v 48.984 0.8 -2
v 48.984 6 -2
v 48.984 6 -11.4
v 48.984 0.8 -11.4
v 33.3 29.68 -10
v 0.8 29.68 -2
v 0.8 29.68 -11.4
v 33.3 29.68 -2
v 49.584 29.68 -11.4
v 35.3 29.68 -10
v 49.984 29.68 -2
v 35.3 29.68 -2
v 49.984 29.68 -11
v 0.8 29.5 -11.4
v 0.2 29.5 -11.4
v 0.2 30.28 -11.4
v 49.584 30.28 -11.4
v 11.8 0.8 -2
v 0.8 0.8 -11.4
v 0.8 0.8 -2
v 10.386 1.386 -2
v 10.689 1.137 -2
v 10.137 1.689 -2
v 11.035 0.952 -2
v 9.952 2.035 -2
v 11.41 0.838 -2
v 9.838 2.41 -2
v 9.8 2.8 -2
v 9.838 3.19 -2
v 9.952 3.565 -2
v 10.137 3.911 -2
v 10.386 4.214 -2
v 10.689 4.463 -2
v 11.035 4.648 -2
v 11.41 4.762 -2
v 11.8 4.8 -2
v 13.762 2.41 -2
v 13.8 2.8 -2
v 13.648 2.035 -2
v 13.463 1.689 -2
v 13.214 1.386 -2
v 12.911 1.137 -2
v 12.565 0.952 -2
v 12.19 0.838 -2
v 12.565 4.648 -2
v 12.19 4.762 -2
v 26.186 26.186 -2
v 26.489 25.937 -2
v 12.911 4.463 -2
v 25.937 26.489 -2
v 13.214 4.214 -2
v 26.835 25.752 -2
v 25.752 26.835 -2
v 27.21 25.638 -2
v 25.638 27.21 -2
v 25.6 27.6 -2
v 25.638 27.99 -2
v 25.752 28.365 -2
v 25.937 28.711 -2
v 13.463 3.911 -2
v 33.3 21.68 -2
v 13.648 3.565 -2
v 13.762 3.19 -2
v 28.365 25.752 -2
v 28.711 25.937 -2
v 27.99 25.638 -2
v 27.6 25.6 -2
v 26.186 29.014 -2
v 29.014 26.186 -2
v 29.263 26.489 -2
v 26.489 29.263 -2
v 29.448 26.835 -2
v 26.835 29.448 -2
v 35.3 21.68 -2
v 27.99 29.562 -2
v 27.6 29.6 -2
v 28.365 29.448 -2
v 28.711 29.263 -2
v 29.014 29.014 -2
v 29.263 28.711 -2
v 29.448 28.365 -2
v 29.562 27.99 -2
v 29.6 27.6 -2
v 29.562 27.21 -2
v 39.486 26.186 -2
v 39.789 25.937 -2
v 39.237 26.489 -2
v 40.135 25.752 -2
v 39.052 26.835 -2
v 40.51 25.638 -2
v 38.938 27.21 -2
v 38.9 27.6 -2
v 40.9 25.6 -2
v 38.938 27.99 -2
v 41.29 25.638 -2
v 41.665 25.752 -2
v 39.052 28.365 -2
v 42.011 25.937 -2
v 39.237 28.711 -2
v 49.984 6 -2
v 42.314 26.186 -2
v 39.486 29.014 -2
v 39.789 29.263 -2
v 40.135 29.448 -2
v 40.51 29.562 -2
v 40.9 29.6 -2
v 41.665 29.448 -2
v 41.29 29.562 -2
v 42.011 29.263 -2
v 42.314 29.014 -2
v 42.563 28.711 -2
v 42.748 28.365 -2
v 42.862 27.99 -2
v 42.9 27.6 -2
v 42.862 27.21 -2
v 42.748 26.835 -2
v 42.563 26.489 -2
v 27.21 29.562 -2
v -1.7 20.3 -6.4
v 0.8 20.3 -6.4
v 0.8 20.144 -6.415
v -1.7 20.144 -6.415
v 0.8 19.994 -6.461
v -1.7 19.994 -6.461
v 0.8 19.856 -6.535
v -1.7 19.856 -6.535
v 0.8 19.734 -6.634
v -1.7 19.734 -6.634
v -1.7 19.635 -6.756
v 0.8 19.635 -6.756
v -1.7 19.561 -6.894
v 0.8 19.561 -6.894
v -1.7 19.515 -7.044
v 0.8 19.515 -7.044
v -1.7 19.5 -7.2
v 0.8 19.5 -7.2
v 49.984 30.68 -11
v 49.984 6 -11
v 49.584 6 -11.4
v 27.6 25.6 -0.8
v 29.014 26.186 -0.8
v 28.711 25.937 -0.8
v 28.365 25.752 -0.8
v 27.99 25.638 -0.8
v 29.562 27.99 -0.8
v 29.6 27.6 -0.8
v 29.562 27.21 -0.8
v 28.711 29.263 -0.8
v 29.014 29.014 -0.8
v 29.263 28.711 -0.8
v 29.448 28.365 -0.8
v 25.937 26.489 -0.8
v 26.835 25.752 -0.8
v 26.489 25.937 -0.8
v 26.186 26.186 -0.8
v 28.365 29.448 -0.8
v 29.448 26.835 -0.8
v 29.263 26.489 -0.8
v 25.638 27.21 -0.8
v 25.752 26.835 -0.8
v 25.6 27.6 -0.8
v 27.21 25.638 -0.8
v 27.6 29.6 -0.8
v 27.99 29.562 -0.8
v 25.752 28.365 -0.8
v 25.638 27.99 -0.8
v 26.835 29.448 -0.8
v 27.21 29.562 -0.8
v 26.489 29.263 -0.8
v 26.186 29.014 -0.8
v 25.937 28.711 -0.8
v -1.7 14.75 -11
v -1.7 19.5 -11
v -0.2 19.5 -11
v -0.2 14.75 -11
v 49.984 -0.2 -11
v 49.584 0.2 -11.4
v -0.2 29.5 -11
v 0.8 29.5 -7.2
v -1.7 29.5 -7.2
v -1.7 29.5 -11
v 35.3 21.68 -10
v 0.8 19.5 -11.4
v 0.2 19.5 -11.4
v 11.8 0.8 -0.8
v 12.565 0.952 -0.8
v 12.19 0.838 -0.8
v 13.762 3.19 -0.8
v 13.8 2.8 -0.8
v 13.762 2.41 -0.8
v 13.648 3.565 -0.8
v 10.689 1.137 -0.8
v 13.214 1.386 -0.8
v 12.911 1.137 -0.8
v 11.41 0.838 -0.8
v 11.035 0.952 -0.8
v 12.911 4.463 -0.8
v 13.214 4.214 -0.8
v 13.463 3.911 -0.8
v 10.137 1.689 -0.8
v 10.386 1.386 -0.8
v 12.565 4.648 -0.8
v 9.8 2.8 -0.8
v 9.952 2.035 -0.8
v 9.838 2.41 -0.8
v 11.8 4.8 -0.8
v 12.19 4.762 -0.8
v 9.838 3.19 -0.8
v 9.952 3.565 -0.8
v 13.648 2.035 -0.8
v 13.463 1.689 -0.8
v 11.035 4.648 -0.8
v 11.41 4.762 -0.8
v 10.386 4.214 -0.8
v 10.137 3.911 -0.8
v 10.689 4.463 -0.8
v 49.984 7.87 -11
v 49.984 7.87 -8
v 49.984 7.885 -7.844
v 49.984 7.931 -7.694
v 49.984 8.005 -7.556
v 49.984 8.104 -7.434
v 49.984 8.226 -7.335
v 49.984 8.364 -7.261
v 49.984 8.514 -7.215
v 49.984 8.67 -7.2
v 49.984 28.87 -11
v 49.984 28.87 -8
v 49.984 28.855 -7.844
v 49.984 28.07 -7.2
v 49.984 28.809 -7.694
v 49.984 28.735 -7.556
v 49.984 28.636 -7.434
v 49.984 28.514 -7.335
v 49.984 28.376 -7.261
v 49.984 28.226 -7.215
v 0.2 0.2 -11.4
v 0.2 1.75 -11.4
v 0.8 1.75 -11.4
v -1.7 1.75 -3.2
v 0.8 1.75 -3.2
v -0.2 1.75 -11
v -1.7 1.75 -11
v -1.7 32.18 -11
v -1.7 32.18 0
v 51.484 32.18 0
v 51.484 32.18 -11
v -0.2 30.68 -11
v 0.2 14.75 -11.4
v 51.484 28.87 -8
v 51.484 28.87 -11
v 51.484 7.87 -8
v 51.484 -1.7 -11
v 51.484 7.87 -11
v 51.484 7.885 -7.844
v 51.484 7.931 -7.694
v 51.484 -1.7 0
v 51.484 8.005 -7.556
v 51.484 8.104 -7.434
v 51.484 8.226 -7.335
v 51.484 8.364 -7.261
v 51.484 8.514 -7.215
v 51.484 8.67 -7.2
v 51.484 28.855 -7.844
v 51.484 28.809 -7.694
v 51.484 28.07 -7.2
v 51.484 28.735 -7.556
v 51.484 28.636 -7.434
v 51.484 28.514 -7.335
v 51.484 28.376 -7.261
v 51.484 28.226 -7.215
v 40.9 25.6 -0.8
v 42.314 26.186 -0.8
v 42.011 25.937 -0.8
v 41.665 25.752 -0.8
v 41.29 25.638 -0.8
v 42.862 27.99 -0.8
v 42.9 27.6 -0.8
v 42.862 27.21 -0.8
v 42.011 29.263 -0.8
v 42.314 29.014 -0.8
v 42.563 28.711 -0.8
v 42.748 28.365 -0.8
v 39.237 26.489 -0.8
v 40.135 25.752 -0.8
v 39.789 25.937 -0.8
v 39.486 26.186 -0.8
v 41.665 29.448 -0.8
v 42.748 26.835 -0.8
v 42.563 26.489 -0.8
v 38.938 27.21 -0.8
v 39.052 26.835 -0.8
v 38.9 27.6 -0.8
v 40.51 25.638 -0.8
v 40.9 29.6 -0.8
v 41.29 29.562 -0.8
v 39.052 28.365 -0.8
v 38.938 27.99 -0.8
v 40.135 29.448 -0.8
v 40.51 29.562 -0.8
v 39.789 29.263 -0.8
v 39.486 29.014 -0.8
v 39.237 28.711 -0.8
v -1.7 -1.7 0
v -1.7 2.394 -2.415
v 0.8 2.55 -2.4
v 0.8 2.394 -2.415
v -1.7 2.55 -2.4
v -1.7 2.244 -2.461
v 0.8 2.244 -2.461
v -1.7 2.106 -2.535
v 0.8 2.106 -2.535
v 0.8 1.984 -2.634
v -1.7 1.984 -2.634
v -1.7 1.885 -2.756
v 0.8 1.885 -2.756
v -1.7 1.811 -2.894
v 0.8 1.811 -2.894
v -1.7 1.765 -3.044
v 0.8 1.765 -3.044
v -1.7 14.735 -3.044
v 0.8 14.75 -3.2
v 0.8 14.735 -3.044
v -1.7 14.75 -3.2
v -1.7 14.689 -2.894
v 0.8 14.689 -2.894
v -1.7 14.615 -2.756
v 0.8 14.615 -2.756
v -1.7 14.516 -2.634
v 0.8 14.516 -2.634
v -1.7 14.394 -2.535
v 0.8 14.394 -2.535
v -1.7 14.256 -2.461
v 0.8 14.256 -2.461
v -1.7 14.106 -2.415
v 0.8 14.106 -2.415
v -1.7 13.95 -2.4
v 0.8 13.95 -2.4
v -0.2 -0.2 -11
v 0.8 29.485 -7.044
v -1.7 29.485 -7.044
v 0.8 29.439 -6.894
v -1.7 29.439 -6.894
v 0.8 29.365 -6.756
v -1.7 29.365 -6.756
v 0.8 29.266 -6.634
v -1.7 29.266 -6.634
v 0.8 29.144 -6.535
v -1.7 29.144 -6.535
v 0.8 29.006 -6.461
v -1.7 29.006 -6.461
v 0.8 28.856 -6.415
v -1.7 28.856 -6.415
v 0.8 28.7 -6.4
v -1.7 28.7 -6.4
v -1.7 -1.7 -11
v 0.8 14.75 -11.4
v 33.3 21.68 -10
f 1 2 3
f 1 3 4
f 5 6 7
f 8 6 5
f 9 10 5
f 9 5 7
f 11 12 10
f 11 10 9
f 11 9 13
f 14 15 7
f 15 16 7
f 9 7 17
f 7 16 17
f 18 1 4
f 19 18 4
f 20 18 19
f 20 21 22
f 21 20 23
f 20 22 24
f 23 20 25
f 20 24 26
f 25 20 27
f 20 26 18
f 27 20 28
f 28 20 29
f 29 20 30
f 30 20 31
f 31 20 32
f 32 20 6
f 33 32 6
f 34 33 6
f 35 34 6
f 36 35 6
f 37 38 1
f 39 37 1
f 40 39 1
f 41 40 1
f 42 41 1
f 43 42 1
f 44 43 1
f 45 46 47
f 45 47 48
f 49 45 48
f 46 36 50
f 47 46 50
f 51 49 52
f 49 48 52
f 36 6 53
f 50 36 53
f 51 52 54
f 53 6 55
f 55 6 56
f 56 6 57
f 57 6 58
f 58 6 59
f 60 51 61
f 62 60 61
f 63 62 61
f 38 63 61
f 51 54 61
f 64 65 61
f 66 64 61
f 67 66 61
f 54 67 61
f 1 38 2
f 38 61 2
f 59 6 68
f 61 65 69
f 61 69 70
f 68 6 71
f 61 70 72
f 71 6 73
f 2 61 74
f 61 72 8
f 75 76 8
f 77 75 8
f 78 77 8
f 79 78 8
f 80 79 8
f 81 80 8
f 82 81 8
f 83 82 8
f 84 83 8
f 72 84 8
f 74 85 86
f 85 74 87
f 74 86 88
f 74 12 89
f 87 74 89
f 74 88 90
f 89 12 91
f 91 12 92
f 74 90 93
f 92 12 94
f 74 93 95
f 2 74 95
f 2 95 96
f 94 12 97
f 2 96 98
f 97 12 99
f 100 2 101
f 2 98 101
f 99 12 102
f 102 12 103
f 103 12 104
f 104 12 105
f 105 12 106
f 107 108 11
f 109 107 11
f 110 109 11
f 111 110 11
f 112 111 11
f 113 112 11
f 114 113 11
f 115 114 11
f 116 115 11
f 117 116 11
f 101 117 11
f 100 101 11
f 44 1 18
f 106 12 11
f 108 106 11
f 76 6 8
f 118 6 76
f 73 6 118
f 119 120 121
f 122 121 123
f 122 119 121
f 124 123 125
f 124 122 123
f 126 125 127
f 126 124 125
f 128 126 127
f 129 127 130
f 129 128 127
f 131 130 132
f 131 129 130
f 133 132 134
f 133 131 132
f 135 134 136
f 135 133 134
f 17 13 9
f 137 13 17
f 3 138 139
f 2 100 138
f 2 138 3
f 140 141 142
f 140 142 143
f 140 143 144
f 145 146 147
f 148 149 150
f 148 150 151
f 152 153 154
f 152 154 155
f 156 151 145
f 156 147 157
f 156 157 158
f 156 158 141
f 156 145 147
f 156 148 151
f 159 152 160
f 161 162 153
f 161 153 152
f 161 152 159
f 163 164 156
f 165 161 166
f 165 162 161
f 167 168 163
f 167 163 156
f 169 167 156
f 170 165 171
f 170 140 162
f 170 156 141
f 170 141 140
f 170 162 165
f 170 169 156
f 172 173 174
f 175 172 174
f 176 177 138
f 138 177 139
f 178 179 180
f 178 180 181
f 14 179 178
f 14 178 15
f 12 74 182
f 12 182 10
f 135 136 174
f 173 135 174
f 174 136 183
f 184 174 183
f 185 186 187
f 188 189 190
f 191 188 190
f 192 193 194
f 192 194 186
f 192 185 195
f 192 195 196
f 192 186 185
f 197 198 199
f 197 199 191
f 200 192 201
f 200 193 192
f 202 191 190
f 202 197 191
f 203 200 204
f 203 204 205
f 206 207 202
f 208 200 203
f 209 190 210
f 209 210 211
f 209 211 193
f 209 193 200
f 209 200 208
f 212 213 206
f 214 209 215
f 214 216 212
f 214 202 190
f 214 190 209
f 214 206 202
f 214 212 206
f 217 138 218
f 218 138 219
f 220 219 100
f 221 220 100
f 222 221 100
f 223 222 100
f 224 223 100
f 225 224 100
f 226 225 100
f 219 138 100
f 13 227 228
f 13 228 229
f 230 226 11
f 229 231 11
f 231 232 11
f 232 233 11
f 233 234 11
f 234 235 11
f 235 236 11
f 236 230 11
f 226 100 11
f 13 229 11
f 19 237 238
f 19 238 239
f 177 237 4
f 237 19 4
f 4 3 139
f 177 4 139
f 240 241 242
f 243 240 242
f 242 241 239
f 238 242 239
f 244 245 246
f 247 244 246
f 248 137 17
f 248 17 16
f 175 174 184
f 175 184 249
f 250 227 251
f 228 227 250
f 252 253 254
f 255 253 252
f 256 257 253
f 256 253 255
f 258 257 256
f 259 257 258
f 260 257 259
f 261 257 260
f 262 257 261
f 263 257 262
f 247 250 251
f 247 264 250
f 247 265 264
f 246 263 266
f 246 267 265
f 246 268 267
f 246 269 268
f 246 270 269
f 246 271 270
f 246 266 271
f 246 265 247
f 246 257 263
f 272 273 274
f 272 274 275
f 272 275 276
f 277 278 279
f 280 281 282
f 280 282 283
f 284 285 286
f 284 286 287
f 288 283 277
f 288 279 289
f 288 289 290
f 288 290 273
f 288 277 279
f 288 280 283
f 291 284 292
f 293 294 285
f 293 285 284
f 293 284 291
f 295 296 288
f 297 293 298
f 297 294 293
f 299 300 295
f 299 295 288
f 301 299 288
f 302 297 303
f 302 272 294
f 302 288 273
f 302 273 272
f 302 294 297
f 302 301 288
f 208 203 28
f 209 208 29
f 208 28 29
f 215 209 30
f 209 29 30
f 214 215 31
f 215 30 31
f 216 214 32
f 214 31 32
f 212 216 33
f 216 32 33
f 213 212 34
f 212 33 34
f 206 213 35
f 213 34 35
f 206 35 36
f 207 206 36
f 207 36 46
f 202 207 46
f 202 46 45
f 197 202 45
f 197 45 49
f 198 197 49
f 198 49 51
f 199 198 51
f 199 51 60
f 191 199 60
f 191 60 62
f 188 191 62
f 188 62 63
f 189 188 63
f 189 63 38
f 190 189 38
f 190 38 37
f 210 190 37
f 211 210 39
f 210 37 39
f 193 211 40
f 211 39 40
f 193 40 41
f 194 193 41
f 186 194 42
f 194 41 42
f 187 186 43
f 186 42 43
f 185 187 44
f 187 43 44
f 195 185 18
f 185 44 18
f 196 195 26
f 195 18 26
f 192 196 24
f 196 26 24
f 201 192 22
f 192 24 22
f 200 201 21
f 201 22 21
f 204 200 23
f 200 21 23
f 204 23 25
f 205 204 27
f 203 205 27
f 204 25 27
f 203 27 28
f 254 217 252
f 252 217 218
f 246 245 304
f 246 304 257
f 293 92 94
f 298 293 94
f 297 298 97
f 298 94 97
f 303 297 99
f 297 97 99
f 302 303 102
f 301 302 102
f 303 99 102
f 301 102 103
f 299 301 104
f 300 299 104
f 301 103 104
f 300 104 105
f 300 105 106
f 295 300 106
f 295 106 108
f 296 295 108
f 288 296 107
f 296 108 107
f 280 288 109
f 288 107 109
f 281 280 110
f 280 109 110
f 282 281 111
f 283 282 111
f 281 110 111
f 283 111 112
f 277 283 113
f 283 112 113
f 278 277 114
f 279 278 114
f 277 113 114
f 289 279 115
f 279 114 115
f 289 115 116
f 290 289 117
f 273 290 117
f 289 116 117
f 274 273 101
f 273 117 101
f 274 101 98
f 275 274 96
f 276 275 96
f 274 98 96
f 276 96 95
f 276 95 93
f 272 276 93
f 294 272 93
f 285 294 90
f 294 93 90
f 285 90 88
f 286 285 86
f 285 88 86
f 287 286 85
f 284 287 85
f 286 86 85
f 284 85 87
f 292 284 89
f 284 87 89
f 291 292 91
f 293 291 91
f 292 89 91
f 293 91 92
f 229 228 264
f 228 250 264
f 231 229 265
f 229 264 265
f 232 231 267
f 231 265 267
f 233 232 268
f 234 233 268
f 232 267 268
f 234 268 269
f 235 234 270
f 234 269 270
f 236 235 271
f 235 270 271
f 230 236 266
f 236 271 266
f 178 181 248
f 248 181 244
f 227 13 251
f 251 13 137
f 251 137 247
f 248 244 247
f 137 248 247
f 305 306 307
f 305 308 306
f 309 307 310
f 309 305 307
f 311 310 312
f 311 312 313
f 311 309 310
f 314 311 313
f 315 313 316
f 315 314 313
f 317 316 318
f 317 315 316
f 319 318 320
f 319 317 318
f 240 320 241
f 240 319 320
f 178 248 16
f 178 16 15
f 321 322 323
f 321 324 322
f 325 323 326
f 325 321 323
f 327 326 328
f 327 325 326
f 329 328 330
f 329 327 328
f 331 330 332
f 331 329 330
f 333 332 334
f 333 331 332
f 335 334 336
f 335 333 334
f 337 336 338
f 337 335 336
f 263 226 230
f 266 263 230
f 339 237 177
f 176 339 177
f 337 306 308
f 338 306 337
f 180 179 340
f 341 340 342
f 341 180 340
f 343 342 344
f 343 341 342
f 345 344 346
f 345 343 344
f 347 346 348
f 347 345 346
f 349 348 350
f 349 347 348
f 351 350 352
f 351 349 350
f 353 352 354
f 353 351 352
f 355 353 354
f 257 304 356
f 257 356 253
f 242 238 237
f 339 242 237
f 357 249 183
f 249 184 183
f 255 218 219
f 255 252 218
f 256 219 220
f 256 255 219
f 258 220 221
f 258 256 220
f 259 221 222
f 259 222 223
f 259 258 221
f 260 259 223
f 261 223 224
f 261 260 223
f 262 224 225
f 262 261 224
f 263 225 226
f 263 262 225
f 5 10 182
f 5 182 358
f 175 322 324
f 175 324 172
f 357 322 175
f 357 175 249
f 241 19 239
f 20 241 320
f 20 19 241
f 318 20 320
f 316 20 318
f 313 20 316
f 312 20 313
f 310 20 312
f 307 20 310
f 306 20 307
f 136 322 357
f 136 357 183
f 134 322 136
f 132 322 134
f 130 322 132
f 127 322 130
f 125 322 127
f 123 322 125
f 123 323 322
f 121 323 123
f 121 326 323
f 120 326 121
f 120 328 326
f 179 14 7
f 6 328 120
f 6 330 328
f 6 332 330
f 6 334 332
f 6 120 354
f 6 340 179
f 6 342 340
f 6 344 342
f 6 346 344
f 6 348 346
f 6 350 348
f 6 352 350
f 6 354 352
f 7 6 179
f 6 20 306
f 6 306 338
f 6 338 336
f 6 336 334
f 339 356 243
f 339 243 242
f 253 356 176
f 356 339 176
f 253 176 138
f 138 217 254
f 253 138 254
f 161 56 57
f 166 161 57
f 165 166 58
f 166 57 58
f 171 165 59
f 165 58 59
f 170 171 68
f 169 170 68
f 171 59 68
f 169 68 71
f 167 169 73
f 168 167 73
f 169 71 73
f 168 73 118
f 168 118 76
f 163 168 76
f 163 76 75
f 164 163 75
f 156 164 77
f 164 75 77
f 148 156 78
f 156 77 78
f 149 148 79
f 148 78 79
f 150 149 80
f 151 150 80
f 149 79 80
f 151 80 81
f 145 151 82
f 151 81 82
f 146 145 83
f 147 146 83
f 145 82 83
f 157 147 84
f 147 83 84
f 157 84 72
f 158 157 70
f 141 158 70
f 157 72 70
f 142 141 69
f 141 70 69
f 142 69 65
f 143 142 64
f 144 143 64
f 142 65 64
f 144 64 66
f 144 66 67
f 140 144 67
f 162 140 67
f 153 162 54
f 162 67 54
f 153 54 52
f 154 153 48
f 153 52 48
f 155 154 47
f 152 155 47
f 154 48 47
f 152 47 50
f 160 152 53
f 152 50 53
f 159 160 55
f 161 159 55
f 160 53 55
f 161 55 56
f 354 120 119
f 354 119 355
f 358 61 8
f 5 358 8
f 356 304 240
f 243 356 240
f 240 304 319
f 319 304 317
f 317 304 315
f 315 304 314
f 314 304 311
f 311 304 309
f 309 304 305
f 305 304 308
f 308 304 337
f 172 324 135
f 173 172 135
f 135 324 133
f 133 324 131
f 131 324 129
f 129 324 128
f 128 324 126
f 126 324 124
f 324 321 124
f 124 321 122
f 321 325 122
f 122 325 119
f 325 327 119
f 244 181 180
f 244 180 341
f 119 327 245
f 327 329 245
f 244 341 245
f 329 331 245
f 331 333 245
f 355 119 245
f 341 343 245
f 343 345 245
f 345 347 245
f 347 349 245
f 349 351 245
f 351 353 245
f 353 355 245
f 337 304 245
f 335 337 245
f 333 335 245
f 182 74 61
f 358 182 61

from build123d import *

# Parameters (mm, degrees)
SKETCH_1_W          = 48.184
SKETCH_1_H          = 28.88
SKETCH_1_W_2        = 1
SKETCH_1_H_2        = 23.68
EXTRUDE_1_DEPTH     = 2
EXTRUDE_2_DEPTH     = 11.4
SKETCH_1_7_W        = 53.184
SKETCH_1_7_H        = 33.88
SKETCH_1_7_W_2      = 50.184
SKETCH_1_7_H_2      = 30.88
EXTRUDE_3_DEPTH     = 11
SKETCH_2_W          = 3.8
SKETCH_2_H          = 21
CUT_EXTRUDE_1_DEPTH = 62.941490586
SKETCH_3_W          = 5
SKETCH_3_H          = 10
SKETCH_3_W_2        = 9
SKETCH_3_H_2        = 13
CUT_EXTRUDE_2_DEPTH = 62.109575813
FILLET_1_R          = 0.8
CHAMFER_1_SIZE      = 0.4
SKETCH_4_R          = 2
CUT_EXTRUDE_3_DEPTH = 1.2
SKETCH_4_3_W        = 2
SKETCH_4_3_H        = 8
EXTRUDE_4_DEPTH     = 8


with BuildPart() as part:
    # Эскиз1 → Бобышка-Вытянуть1 (new body)
    with BuildSketch(Plane.XY):
        with Locations((24.892, 15.24)):
            Rectangle(SKETCH_1_W, SKETCH_1_H)
        with Locations((49.484, 17.84)):
            Rectangle(SKETCH_1_W_2, SKETCH_1_H_2)
    extrude(amount=-EXTRUDE_1_DEPTH)

    # Эскиз1<6> → Бобышка-Вытянуть2 (add)
    with BuildSketch(Plane.XY):
        Polygon((0.8, 29.68), (48.984, 29.68), (49.984, 29.68), (49.984, 30.68), (-0.2, 30.68), (-0.2, -0.2), (49.984, -0.2), (49.984, 6), (48.984, 6), (48.984, 0.8), (0.8, 0.8), align=None)
    extrude(amount=-EXTRUDE_2_DEPTH)

    # Эскиз1<7> → Бобышка-Вытянуть3 (add)
    with BuildSketch(Plane.XY):
        with Locations((24.892, 15.24)):
            Rectangle(SKETCH_1_7_W, SKETCH_1_7_H)
        with Locations((24.892, 15.24)):
            Rectangle(SKETCH_1_7_W_2, SKETCH_1_7_H_2, mode=Mode.SUBTRACT)
    extrude(amount=-EXTRUDE_3_DEPTH)

    # Эскиз2 → Вырез-Вытянуть1 (cut, through all)
    with BuildSketch(Plane.ZY.offset(-49.984)):
        with Locations((-9.1, 18.37)):
            Rectangle(SKETCH_2_W, SKETCH_2_H)
    extrude(amount=-CUT_EXTRUDE_1_DEPTH, mode=Mode.SUBTRACT)

    # Эскиз3 → Вырез-Вытянуть2 (cut, through all)
    with BuildSketch(Plane(origin=(0.8, 0, 0), x_dir=(0, 0, -1), z_dir=(1, 0, 0))):
        with Locations((8.9, 24.5)):
            Rectangle(SKETCH_3_W, SKETCH_3_H)
        with Locations((6.9, 8.25)):
            Rectangle(SKETCH_3_W_2, SKETCH_3_H_2)
    extrude(amount=-CUT_EXTRUDE_2_DEPTH, mode=Mode.SUBTRACT)

    # Скругление1
    fillet_1_edges = [part.edges().sort_by_distance(p)[0] for p in [
        (-0.45, 29.5, -6.4),
        (-0.45, 19.5, -6.4),
        (-0.45, 14.75, -2.4),
        (-0.45, 1.75, -2.4),
        (50.734, 28.87, -7.2),
        (50.734, 7.87, -7.2),
    ]]
    fillet(fillet_1_edges, radius=FILLET_1_R)

    # Фаска1
    chamfer_1_edges = [part.edges().sort_by_distance(p)[0] for p in [
        (-0.2, 0.775, -11.4),
        (24.892, -0.2, -11.4),
        (49.984, 2.9, -11.4),
        (49.984, 30.18, -11.4),
        (24.892, 30.68, -11.4),
        (-0.2, 30.09, -11.4),
        (-0.2, 17.125, -11.4),
    ]]
    chamfer(chamfer_1_edges, length=CHAMFER_1_SIZE - 0.0001)  # a hair under: the kernel refuses the full size

    # Эскиз4 → Вырез-Вытянуть3 (cut)
    with BuildSketch(Plane(origin=(0, 0, -2), x_dir=(-1, 0, 0), z_dir=(0, 0, -1))):
        with Locations((-40.9, 27.6)):
            Circle(SKETCH_4_R)
        with Locations((-27.6, 27.6)):
            Circle(SKETCH_4_R)
        with Locations((-11.8, 2.8)):
            Circle(SKETCH_4_R)
    extrude(amount=-CUT_EXTRUDE_3_DEPTH, mode=Mode.SUBTRACT)

    # Эскиз4<3> → Бобышка-Вытянуть4 (add)
    with BuildSketch(Plane(origin=(0, 0, -2), x_dir=(-1, 0, 0), z_dir=(0, 0, -1))):
        with Locations((-34.3, 25.68)):
            Rectangle(SKETCH_4_3_W, SKETCH_4_3_H)
    extrude(amount=EXTRUDE_4_DEPTH)


solid = part.part
